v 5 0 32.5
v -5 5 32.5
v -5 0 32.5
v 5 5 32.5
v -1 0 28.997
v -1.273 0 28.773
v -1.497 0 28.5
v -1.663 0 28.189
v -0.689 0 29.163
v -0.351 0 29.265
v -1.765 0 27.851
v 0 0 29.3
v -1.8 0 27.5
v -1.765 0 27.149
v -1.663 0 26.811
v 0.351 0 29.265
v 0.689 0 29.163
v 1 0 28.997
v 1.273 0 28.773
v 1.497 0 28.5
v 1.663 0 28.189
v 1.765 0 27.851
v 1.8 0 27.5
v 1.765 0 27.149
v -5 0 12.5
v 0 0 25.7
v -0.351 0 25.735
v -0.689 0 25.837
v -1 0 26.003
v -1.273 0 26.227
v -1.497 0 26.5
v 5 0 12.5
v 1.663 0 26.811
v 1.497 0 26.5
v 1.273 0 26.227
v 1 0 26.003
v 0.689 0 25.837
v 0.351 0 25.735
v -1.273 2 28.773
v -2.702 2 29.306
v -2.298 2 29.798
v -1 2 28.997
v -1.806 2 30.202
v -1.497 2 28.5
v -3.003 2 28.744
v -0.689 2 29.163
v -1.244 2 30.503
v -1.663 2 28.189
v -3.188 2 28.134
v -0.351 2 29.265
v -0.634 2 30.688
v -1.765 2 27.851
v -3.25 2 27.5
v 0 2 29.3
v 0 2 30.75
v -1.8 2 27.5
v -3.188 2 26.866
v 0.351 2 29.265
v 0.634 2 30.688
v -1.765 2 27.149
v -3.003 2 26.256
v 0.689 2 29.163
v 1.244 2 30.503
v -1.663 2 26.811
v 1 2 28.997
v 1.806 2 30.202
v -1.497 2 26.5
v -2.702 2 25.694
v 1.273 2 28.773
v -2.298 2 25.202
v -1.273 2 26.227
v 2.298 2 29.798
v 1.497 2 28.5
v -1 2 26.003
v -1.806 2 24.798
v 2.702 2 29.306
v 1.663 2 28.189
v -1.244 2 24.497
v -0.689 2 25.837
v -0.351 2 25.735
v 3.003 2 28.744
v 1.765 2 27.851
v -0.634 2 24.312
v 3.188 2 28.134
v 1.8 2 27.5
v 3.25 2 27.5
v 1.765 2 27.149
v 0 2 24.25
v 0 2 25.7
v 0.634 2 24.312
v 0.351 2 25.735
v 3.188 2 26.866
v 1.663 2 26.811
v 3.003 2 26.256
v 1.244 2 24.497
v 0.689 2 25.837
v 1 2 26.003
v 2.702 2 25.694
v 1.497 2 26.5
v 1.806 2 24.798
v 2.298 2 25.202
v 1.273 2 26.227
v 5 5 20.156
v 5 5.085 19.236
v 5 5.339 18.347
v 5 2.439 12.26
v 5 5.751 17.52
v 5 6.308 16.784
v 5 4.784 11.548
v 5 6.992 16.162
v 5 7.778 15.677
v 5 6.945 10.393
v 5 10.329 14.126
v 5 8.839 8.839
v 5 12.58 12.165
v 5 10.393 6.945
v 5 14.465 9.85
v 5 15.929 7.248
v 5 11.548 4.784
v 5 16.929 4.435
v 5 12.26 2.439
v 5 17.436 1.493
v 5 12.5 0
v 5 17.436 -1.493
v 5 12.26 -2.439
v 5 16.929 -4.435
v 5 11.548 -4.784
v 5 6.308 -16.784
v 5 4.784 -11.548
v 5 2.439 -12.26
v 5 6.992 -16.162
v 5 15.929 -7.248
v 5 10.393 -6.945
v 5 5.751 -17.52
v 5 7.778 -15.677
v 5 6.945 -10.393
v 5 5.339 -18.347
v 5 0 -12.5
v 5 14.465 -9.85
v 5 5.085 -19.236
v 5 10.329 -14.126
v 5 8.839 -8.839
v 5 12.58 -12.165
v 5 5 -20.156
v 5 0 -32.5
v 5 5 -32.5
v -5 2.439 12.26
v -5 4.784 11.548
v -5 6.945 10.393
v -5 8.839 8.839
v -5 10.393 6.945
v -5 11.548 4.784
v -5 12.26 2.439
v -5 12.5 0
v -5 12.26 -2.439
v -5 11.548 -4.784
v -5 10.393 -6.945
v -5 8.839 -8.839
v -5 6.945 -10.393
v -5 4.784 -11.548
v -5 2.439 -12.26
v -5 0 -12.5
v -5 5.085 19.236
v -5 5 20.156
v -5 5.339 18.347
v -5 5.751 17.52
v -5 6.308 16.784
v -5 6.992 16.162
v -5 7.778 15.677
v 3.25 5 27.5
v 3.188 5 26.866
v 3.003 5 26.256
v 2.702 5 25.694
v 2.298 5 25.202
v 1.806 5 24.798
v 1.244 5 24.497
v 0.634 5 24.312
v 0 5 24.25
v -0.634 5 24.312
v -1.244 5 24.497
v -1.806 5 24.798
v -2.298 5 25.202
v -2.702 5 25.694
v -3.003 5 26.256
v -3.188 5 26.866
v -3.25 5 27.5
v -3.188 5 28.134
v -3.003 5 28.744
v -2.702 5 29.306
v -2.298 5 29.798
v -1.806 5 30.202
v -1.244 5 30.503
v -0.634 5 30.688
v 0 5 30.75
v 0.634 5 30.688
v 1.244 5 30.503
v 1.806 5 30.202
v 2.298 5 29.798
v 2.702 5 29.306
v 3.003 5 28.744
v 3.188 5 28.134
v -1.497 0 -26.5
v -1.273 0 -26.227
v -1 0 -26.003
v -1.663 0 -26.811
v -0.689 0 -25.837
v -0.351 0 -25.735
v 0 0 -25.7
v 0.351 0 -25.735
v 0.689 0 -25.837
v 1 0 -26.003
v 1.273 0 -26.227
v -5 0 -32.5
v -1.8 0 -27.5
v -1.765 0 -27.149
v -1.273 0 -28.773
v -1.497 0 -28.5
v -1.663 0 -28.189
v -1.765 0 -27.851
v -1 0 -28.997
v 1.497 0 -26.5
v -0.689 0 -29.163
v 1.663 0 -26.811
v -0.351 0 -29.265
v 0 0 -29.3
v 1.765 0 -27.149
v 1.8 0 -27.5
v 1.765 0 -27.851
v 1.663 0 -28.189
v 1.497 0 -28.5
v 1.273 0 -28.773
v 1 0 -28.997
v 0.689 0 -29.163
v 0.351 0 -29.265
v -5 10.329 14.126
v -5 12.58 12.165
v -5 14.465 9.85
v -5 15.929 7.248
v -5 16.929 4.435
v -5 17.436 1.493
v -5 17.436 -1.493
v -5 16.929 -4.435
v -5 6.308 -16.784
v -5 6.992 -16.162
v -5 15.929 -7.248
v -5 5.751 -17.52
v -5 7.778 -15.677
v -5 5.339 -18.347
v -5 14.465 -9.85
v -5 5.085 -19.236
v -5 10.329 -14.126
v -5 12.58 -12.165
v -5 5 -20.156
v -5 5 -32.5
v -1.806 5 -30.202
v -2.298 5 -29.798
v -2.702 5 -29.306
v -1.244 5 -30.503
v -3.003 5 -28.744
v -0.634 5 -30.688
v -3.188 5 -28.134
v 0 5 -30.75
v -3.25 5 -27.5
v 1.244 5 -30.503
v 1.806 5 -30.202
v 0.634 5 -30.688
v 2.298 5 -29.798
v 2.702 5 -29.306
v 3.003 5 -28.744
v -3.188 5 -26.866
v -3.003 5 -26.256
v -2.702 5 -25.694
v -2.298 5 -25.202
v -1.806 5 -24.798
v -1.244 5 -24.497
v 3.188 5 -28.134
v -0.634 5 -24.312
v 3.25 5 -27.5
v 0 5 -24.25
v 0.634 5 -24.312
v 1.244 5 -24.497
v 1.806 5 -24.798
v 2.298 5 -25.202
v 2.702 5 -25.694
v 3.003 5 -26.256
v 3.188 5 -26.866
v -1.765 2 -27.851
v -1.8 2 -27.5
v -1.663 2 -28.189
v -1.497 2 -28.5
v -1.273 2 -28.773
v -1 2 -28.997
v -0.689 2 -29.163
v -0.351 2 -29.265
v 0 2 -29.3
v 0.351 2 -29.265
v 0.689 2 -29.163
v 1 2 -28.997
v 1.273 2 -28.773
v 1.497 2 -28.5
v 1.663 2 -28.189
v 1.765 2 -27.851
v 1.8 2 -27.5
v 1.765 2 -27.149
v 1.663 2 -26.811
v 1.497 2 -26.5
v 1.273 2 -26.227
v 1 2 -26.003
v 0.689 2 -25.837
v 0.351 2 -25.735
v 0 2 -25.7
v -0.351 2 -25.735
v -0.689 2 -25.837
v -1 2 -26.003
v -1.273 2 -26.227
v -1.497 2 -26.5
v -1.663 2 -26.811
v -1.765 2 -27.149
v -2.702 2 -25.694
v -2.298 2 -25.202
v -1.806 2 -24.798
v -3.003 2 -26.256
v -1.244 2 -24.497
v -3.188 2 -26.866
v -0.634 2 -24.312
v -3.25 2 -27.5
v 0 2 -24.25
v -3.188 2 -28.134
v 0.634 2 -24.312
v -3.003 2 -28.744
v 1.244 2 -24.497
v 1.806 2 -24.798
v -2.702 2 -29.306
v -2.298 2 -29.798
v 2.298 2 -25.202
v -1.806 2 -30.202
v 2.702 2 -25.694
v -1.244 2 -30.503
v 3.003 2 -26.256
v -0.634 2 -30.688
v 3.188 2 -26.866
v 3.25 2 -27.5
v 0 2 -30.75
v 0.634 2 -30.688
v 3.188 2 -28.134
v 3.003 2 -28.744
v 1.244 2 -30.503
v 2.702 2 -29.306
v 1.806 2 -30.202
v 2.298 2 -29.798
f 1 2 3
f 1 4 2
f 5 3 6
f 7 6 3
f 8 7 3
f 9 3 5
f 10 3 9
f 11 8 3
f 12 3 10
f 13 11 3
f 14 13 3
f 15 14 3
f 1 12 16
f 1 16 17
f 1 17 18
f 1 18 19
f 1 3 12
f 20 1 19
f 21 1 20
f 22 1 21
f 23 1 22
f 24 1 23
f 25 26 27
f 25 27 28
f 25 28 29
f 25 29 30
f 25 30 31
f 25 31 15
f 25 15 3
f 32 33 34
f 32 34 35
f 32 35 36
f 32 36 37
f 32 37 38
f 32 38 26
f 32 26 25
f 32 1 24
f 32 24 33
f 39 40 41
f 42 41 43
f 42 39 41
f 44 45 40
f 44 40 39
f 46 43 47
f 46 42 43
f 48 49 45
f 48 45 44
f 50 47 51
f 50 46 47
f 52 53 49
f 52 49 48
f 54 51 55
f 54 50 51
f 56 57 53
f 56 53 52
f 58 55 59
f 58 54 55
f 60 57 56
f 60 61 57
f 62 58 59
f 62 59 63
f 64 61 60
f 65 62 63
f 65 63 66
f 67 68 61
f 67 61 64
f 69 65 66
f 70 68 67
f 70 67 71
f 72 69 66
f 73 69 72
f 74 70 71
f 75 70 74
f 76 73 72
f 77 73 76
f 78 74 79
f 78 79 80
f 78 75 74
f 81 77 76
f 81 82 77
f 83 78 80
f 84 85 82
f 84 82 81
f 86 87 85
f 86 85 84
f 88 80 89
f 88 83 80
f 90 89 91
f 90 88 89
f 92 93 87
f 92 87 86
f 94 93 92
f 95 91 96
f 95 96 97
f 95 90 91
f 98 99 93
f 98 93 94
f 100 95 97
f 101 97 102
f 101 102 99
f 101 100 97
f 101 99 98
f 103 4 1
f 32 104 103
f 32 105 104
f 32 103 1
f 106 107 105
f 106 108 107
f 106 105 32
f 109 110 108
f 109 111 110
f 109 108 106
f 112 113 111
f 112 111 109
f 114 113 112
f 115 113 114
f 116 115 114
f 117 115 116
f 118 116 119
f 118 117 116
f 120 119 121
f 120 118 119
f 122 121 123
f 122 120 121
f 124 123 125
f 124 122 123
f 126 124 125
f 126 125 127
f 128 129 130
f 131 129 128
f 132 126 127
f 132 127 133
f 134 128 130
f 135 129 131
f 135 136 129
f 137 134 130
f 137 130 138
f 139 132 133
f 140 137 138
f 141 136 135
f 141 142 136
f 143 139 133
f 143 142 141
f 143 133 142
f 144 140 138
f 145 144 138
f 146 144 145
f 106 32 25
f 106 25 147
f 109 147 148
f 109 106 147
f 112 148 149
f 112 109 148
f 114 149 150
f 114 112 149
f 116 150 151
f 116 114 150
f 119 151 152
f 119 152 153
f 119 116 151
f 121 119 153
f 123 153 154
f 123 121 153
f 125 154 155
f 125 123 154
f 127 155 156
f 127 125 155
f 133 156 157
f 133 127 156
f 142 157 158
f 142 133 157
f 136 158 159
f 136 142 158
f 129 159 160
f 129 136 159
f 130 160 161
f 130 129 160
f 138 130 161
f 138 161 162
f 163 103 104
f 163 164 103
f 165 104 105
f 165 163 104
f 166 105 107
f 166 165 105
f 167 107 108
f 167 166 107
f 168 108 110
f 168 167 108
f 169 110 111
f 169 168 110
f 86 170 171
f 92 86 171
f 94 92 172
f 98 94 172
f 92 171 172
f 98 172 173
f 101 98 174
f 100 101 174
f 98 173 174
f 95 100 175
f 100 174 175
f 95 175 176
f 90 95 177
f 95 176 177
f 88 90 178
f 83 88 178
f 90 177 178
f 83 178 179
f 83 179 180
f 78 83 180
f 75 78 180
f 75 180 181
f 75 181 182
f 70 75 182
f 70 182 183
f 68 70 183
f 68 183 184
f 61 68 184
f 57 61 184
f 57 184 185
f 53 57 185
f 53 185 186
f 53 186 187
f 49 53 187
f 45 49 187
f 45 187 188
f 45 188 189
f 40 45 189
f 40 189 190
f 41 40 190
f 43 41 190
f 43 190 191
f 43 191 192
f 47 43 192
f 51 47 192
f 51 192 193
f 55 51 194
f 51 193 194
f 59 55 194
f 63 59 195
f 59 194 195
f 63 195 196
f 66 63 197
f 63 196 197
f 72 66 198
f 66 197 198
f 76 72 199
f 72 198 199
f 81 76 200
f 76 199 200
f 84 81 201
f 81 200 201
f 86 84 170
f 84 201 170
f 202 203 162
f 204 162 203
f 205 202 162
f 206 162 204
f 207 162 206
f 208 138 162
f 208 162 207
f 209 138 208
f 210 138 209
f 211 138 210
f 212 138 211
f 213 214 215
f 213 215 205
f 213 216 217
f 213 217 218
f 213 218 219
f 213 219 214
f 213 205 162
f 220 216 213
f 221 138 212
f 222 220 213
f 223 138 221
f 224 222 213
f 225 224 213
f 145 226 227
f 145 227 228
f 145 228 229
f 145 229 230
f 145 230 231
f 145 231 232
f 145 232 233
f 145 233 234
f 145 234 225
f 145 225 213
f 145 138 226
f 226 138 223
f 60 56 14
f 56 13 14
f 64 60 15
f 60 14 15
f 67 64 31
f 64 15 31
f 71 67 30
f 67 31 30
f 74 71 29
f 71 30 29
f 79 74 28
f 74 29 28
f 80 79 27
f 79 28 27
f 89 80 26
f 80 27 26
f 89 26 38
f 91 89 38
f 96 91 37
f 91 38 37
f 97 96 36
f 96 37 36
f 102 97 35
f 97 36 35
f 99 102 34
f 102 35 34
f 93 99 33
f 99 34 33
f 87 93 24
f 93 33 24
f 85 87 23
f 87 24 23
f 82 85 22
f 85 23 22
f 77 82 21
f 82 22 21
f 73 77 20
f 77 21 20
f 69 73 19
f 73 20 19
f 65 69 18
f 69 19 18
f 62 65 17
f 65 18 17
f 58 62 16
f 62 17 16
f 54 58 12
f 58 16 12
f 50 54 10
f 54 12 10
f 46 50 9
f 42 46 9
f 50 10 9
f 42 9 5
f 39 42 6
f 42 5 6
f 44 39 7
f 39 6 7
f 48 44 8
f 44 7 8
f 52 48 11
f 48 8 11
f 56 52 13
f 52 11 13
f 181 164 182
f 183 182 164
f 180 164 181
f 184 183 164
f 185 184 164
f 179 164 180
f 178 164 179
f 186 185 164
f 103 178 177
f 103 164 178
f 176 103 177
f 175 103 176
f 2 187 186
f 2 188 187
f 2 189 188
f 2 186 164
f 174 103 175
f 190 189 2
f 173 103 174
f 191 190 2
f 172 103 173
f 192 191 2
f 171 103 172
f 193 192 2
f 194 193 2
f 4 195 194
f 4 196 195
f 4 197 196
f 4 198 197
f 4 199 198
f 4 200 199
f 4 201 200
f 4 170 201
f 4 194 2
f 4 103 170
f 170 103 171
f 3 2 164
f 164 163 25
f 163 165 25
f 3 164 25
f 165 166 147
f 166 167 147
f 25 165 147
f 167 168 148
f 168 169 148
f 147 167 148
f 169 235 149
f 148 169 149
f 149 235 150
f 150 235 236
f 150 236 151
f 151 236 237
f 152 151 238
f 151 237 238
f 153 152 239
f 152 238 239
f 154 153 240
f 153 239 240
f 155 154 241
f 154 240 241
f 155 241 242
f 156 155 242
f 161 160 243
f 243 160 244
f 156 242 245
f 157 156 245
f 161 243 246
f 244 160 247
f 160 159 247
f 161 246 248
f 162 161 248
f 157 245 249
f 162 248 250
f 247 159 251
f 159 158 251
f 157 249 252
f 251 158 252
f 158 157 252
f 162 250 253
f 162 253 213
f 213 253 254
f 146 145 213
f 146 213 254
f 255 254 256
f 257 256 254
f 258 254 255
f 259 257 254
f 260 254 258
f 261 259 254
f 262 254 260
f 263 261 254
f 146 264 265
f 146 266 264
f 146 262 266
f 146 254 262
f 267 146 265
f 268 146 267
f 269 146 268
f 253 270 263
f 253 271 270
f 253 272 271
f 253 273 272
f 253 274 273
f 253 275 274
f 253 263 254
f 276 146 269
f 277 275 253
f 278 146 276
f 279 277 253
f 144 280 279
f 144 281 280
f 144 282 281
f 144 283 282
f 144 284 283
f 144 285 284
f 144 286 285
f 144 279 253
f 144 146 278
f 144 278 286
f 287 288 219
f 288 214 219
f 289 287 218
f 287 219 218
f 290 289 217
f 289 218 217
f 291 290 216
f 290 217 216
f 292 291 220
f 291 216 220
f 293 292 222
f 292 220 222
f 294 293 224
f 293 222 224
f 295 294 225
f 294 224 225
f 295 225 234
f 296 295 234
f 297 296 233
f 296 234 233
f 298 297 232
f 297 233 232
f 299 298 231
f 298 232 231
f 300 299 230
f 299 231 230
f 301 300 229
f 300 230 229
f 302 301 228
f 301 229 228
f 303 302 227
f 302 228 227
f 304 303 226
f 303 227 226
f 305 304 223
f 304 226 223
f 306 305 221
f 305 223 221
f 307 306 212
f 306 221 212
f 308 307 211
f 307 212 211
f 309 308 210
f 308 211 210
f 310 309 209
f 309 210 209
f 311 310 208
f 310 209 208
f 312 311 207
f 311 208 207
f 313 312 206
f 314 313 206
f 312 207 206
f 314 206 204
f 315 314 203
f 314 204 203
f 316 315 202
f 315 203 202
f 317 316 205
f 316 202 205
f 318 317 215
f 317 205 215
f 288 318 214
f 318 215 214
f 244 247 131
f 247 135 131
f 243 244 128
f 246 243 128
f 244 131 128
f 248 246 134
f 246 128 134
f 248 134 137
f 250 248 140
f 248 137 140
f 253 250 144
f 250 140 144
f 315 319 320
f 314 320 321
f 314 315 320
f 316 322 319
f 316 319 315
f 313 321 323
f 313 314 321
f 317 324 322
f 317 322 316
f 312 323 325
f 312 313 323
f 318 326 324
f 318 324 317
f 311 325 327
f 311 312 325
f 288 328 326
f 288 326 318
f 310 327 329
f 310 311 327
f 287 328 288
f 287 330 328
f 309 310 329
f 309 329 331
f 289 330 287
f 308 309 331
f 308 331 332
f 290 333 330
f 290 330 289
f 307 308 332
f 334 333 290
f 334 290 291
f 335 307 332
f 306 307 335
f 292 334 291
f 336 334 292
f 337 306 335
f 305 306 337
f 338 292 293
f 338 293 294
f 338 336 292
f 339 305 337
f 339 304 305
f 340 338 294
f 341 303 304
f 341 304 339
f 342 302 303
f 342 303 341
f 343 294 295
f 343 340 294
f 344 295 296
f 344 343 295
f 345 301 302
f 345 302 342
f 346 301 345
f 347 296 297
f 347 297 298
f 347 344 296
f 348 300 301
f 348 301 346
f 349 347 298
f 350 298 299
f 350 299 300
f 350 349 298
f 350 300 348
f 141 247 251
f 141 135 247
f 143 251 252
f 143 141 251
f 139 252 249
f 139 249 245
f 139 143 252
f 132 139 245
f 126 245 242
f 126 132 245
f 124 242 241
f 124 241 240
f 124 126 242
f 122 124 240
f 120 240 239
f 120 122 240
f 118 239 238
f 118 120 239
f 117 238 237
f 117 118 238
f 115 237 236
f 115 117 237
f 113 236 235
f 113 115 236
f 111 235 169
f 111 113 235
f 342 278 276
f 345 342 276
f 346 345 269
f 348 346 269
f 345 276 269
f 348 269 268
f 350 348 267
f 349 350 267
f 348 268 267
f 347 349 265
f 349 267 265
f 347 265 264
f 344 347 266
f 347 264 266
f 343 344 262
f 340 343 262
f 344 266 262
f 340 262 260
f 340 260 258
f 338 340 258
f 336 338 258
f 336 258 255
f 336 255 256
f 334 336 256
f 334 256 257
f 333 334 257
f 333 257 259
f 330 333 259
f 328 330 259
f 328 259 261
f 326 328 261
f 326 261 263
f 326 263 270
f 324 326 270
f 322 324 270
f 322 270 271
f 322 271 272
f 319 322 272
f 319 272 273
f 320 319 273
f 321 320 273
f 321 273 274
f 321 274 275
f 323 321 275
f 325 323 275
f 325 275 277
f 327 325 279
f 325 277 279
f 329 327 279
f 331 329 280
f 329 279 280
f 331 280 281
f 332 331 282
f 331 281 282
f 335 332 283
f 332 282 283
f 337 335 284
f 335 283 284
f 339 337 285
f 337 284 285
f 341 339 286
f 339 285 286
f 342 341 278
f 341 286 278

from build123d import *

# Parameters (mm, degrees)
BOSS_EXTRUDE1_DEPTH            = 5
CBORE_FOR_M3_SHCS1_D           = 3.6
CBORE_FOR_M3_SHCS1_DEPTH       = 5
CBORE_FOR_M3_SHCS1_CBORE_D     = 6.5
CBORE_FOR_M3_SHCS1_CBORE_DEPTH = 3
CBORE_FOR_M3_SHCS1_TIP         = 1.081549114
FILLET1_R                      = 5


with BuildPart() as part:
    # Sketch1 → Boss-Extrude1 (new body, symmetric)
    with BuildSketch(Plane(origin=(0, 0, 0), x_dir=(0, 0, -1), z_dir=(1, 0, 0))):
        with BuildLine():
            Line((-32.5, 0), (-12.5, 0))
            ThreePointArc((-12.5, 0), (0, 12.5), (12.5, 0))
            Line((12.5, 0), (32.5, 0))
            Line((32.5, 0), (32.5, 5))
            Line((32.5, 5), (16.770509831, 5))
            ThreePointArc((16.770509831, 5), (0, 17.5), (-16.770509831, 5))
            Line((-16.770509831, 5), (-32.5, 5))
            Line((-32.5, 5), (-32.5, 0))
        make_face()
    extrude(amount=BOSS_EXTRUDE1_DEPTH, both=True)

    # CBORE for M3 SHCS1
    with Locations(Plane(origin=(-41.05, 5, 0), x_dir=(1, 0, 0), z_dir=(0, 1, 0))):
        with Locations((41.05, -27.5), (41.05, 27.5)):
            CounterBoreHole(CBORE_FOR_M3_SHCS1_D / 2, CBORE_FOR_M3_SHCS1_CBORE_D / 2, CBORE_FOR_M3_SHCS1_CBORE_DEPTH, depth=CBORE_FOR_M3_SHCS1_DEPTH)
            with Locations((0, 0, -(CBORE_FOR_M3_SHCS1_DEPTH + CBORE_FOR_M3_SHCS1_TIP / 2))):  # 118° drill point
                Cone(0, CBORE_FOR_M3_SHCS1_D / 2, CBORE_FOR_M3_SHCS1_TIP, mode=Mode.SUBTRACT)

    # Fillet1
    fillet1_edges = [part.edges().sort_by_distance(p)[0] for p in [
        (0, 5, 16.770509831),
        (0, 5, -16.770509831),
    ]]
    fillet(fillet1_edges, radius=FILLET1_R)


solid = part.part
